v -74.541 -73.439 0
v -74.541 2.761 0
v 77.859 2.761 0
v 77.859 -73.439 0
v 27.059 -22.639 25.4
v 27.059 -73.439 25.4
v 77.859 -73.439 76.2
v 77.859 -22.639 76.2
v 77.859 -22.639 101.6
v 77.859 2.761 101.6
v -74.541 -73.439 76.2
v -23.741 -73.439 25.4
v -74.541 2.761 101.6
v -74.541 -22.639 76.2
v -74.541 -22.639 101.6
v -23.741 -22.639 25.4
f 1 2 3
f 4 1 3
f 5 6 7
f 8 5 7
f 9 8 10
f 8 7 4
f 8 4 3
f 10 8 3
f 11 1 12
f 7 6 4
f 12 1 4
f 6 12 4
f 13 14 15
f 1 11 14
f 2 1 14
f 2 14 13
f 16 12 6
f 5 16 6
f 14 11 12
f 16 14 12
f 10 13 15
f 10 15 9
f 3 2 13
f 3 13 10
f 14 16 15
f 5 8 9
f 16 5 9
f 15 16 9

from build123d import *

# Parameters (mm, degrees)
F0_W     = 152.4
F0_H     = 76.2
F1_DEPTH = 101.6
F2_W     = 50.8
F2_H     = 25.4
F3_DEPTH = 152.4
F5_DEPTH = 50.8


with BuildPart() as f1:
    # F0 (on Top) → F1 (new body)
    with BuildSketch(Plane.XY):
        with Locations((1.659449, -35.339441)):
            Rectangle(F0_W, F0_H)
    extrude(amount=F1_DEPTH)

    # F2 (on face) → F3 (cut)
    with BuildSketch(Plane.YZ.offset(77.859449)):
        with Locations((-48.039441, 88.9)):
            Rectangle(F2_W, F2_H)
    extrude(amount=-F3_DEPTH, mode=Mode.SUBTRACT)

    # F4 (on face) → F5 (cut)
    with BuildSketch(Plane.XZ.offset(73.439441)):
        Polygon((77.859449, 76.2), (27.059449, 76.2), (27.059449, 41.245621), (27.059449, 25.4), align=None)
        Polygon((27.059449, 76.2), (-23.740551, 76.2), (-23.740551, 25.4), (27.059449, 25.4), (27.059449, 41.245621), align=None)
        Polygon((-23.740551, 76.2), (-74.540551, 76.2), (-23.740551, 25.4), align=None)
    extrude(amount=-F5_DEPTH, mode=Mode.SUBTRACT)


solid = f1.part
